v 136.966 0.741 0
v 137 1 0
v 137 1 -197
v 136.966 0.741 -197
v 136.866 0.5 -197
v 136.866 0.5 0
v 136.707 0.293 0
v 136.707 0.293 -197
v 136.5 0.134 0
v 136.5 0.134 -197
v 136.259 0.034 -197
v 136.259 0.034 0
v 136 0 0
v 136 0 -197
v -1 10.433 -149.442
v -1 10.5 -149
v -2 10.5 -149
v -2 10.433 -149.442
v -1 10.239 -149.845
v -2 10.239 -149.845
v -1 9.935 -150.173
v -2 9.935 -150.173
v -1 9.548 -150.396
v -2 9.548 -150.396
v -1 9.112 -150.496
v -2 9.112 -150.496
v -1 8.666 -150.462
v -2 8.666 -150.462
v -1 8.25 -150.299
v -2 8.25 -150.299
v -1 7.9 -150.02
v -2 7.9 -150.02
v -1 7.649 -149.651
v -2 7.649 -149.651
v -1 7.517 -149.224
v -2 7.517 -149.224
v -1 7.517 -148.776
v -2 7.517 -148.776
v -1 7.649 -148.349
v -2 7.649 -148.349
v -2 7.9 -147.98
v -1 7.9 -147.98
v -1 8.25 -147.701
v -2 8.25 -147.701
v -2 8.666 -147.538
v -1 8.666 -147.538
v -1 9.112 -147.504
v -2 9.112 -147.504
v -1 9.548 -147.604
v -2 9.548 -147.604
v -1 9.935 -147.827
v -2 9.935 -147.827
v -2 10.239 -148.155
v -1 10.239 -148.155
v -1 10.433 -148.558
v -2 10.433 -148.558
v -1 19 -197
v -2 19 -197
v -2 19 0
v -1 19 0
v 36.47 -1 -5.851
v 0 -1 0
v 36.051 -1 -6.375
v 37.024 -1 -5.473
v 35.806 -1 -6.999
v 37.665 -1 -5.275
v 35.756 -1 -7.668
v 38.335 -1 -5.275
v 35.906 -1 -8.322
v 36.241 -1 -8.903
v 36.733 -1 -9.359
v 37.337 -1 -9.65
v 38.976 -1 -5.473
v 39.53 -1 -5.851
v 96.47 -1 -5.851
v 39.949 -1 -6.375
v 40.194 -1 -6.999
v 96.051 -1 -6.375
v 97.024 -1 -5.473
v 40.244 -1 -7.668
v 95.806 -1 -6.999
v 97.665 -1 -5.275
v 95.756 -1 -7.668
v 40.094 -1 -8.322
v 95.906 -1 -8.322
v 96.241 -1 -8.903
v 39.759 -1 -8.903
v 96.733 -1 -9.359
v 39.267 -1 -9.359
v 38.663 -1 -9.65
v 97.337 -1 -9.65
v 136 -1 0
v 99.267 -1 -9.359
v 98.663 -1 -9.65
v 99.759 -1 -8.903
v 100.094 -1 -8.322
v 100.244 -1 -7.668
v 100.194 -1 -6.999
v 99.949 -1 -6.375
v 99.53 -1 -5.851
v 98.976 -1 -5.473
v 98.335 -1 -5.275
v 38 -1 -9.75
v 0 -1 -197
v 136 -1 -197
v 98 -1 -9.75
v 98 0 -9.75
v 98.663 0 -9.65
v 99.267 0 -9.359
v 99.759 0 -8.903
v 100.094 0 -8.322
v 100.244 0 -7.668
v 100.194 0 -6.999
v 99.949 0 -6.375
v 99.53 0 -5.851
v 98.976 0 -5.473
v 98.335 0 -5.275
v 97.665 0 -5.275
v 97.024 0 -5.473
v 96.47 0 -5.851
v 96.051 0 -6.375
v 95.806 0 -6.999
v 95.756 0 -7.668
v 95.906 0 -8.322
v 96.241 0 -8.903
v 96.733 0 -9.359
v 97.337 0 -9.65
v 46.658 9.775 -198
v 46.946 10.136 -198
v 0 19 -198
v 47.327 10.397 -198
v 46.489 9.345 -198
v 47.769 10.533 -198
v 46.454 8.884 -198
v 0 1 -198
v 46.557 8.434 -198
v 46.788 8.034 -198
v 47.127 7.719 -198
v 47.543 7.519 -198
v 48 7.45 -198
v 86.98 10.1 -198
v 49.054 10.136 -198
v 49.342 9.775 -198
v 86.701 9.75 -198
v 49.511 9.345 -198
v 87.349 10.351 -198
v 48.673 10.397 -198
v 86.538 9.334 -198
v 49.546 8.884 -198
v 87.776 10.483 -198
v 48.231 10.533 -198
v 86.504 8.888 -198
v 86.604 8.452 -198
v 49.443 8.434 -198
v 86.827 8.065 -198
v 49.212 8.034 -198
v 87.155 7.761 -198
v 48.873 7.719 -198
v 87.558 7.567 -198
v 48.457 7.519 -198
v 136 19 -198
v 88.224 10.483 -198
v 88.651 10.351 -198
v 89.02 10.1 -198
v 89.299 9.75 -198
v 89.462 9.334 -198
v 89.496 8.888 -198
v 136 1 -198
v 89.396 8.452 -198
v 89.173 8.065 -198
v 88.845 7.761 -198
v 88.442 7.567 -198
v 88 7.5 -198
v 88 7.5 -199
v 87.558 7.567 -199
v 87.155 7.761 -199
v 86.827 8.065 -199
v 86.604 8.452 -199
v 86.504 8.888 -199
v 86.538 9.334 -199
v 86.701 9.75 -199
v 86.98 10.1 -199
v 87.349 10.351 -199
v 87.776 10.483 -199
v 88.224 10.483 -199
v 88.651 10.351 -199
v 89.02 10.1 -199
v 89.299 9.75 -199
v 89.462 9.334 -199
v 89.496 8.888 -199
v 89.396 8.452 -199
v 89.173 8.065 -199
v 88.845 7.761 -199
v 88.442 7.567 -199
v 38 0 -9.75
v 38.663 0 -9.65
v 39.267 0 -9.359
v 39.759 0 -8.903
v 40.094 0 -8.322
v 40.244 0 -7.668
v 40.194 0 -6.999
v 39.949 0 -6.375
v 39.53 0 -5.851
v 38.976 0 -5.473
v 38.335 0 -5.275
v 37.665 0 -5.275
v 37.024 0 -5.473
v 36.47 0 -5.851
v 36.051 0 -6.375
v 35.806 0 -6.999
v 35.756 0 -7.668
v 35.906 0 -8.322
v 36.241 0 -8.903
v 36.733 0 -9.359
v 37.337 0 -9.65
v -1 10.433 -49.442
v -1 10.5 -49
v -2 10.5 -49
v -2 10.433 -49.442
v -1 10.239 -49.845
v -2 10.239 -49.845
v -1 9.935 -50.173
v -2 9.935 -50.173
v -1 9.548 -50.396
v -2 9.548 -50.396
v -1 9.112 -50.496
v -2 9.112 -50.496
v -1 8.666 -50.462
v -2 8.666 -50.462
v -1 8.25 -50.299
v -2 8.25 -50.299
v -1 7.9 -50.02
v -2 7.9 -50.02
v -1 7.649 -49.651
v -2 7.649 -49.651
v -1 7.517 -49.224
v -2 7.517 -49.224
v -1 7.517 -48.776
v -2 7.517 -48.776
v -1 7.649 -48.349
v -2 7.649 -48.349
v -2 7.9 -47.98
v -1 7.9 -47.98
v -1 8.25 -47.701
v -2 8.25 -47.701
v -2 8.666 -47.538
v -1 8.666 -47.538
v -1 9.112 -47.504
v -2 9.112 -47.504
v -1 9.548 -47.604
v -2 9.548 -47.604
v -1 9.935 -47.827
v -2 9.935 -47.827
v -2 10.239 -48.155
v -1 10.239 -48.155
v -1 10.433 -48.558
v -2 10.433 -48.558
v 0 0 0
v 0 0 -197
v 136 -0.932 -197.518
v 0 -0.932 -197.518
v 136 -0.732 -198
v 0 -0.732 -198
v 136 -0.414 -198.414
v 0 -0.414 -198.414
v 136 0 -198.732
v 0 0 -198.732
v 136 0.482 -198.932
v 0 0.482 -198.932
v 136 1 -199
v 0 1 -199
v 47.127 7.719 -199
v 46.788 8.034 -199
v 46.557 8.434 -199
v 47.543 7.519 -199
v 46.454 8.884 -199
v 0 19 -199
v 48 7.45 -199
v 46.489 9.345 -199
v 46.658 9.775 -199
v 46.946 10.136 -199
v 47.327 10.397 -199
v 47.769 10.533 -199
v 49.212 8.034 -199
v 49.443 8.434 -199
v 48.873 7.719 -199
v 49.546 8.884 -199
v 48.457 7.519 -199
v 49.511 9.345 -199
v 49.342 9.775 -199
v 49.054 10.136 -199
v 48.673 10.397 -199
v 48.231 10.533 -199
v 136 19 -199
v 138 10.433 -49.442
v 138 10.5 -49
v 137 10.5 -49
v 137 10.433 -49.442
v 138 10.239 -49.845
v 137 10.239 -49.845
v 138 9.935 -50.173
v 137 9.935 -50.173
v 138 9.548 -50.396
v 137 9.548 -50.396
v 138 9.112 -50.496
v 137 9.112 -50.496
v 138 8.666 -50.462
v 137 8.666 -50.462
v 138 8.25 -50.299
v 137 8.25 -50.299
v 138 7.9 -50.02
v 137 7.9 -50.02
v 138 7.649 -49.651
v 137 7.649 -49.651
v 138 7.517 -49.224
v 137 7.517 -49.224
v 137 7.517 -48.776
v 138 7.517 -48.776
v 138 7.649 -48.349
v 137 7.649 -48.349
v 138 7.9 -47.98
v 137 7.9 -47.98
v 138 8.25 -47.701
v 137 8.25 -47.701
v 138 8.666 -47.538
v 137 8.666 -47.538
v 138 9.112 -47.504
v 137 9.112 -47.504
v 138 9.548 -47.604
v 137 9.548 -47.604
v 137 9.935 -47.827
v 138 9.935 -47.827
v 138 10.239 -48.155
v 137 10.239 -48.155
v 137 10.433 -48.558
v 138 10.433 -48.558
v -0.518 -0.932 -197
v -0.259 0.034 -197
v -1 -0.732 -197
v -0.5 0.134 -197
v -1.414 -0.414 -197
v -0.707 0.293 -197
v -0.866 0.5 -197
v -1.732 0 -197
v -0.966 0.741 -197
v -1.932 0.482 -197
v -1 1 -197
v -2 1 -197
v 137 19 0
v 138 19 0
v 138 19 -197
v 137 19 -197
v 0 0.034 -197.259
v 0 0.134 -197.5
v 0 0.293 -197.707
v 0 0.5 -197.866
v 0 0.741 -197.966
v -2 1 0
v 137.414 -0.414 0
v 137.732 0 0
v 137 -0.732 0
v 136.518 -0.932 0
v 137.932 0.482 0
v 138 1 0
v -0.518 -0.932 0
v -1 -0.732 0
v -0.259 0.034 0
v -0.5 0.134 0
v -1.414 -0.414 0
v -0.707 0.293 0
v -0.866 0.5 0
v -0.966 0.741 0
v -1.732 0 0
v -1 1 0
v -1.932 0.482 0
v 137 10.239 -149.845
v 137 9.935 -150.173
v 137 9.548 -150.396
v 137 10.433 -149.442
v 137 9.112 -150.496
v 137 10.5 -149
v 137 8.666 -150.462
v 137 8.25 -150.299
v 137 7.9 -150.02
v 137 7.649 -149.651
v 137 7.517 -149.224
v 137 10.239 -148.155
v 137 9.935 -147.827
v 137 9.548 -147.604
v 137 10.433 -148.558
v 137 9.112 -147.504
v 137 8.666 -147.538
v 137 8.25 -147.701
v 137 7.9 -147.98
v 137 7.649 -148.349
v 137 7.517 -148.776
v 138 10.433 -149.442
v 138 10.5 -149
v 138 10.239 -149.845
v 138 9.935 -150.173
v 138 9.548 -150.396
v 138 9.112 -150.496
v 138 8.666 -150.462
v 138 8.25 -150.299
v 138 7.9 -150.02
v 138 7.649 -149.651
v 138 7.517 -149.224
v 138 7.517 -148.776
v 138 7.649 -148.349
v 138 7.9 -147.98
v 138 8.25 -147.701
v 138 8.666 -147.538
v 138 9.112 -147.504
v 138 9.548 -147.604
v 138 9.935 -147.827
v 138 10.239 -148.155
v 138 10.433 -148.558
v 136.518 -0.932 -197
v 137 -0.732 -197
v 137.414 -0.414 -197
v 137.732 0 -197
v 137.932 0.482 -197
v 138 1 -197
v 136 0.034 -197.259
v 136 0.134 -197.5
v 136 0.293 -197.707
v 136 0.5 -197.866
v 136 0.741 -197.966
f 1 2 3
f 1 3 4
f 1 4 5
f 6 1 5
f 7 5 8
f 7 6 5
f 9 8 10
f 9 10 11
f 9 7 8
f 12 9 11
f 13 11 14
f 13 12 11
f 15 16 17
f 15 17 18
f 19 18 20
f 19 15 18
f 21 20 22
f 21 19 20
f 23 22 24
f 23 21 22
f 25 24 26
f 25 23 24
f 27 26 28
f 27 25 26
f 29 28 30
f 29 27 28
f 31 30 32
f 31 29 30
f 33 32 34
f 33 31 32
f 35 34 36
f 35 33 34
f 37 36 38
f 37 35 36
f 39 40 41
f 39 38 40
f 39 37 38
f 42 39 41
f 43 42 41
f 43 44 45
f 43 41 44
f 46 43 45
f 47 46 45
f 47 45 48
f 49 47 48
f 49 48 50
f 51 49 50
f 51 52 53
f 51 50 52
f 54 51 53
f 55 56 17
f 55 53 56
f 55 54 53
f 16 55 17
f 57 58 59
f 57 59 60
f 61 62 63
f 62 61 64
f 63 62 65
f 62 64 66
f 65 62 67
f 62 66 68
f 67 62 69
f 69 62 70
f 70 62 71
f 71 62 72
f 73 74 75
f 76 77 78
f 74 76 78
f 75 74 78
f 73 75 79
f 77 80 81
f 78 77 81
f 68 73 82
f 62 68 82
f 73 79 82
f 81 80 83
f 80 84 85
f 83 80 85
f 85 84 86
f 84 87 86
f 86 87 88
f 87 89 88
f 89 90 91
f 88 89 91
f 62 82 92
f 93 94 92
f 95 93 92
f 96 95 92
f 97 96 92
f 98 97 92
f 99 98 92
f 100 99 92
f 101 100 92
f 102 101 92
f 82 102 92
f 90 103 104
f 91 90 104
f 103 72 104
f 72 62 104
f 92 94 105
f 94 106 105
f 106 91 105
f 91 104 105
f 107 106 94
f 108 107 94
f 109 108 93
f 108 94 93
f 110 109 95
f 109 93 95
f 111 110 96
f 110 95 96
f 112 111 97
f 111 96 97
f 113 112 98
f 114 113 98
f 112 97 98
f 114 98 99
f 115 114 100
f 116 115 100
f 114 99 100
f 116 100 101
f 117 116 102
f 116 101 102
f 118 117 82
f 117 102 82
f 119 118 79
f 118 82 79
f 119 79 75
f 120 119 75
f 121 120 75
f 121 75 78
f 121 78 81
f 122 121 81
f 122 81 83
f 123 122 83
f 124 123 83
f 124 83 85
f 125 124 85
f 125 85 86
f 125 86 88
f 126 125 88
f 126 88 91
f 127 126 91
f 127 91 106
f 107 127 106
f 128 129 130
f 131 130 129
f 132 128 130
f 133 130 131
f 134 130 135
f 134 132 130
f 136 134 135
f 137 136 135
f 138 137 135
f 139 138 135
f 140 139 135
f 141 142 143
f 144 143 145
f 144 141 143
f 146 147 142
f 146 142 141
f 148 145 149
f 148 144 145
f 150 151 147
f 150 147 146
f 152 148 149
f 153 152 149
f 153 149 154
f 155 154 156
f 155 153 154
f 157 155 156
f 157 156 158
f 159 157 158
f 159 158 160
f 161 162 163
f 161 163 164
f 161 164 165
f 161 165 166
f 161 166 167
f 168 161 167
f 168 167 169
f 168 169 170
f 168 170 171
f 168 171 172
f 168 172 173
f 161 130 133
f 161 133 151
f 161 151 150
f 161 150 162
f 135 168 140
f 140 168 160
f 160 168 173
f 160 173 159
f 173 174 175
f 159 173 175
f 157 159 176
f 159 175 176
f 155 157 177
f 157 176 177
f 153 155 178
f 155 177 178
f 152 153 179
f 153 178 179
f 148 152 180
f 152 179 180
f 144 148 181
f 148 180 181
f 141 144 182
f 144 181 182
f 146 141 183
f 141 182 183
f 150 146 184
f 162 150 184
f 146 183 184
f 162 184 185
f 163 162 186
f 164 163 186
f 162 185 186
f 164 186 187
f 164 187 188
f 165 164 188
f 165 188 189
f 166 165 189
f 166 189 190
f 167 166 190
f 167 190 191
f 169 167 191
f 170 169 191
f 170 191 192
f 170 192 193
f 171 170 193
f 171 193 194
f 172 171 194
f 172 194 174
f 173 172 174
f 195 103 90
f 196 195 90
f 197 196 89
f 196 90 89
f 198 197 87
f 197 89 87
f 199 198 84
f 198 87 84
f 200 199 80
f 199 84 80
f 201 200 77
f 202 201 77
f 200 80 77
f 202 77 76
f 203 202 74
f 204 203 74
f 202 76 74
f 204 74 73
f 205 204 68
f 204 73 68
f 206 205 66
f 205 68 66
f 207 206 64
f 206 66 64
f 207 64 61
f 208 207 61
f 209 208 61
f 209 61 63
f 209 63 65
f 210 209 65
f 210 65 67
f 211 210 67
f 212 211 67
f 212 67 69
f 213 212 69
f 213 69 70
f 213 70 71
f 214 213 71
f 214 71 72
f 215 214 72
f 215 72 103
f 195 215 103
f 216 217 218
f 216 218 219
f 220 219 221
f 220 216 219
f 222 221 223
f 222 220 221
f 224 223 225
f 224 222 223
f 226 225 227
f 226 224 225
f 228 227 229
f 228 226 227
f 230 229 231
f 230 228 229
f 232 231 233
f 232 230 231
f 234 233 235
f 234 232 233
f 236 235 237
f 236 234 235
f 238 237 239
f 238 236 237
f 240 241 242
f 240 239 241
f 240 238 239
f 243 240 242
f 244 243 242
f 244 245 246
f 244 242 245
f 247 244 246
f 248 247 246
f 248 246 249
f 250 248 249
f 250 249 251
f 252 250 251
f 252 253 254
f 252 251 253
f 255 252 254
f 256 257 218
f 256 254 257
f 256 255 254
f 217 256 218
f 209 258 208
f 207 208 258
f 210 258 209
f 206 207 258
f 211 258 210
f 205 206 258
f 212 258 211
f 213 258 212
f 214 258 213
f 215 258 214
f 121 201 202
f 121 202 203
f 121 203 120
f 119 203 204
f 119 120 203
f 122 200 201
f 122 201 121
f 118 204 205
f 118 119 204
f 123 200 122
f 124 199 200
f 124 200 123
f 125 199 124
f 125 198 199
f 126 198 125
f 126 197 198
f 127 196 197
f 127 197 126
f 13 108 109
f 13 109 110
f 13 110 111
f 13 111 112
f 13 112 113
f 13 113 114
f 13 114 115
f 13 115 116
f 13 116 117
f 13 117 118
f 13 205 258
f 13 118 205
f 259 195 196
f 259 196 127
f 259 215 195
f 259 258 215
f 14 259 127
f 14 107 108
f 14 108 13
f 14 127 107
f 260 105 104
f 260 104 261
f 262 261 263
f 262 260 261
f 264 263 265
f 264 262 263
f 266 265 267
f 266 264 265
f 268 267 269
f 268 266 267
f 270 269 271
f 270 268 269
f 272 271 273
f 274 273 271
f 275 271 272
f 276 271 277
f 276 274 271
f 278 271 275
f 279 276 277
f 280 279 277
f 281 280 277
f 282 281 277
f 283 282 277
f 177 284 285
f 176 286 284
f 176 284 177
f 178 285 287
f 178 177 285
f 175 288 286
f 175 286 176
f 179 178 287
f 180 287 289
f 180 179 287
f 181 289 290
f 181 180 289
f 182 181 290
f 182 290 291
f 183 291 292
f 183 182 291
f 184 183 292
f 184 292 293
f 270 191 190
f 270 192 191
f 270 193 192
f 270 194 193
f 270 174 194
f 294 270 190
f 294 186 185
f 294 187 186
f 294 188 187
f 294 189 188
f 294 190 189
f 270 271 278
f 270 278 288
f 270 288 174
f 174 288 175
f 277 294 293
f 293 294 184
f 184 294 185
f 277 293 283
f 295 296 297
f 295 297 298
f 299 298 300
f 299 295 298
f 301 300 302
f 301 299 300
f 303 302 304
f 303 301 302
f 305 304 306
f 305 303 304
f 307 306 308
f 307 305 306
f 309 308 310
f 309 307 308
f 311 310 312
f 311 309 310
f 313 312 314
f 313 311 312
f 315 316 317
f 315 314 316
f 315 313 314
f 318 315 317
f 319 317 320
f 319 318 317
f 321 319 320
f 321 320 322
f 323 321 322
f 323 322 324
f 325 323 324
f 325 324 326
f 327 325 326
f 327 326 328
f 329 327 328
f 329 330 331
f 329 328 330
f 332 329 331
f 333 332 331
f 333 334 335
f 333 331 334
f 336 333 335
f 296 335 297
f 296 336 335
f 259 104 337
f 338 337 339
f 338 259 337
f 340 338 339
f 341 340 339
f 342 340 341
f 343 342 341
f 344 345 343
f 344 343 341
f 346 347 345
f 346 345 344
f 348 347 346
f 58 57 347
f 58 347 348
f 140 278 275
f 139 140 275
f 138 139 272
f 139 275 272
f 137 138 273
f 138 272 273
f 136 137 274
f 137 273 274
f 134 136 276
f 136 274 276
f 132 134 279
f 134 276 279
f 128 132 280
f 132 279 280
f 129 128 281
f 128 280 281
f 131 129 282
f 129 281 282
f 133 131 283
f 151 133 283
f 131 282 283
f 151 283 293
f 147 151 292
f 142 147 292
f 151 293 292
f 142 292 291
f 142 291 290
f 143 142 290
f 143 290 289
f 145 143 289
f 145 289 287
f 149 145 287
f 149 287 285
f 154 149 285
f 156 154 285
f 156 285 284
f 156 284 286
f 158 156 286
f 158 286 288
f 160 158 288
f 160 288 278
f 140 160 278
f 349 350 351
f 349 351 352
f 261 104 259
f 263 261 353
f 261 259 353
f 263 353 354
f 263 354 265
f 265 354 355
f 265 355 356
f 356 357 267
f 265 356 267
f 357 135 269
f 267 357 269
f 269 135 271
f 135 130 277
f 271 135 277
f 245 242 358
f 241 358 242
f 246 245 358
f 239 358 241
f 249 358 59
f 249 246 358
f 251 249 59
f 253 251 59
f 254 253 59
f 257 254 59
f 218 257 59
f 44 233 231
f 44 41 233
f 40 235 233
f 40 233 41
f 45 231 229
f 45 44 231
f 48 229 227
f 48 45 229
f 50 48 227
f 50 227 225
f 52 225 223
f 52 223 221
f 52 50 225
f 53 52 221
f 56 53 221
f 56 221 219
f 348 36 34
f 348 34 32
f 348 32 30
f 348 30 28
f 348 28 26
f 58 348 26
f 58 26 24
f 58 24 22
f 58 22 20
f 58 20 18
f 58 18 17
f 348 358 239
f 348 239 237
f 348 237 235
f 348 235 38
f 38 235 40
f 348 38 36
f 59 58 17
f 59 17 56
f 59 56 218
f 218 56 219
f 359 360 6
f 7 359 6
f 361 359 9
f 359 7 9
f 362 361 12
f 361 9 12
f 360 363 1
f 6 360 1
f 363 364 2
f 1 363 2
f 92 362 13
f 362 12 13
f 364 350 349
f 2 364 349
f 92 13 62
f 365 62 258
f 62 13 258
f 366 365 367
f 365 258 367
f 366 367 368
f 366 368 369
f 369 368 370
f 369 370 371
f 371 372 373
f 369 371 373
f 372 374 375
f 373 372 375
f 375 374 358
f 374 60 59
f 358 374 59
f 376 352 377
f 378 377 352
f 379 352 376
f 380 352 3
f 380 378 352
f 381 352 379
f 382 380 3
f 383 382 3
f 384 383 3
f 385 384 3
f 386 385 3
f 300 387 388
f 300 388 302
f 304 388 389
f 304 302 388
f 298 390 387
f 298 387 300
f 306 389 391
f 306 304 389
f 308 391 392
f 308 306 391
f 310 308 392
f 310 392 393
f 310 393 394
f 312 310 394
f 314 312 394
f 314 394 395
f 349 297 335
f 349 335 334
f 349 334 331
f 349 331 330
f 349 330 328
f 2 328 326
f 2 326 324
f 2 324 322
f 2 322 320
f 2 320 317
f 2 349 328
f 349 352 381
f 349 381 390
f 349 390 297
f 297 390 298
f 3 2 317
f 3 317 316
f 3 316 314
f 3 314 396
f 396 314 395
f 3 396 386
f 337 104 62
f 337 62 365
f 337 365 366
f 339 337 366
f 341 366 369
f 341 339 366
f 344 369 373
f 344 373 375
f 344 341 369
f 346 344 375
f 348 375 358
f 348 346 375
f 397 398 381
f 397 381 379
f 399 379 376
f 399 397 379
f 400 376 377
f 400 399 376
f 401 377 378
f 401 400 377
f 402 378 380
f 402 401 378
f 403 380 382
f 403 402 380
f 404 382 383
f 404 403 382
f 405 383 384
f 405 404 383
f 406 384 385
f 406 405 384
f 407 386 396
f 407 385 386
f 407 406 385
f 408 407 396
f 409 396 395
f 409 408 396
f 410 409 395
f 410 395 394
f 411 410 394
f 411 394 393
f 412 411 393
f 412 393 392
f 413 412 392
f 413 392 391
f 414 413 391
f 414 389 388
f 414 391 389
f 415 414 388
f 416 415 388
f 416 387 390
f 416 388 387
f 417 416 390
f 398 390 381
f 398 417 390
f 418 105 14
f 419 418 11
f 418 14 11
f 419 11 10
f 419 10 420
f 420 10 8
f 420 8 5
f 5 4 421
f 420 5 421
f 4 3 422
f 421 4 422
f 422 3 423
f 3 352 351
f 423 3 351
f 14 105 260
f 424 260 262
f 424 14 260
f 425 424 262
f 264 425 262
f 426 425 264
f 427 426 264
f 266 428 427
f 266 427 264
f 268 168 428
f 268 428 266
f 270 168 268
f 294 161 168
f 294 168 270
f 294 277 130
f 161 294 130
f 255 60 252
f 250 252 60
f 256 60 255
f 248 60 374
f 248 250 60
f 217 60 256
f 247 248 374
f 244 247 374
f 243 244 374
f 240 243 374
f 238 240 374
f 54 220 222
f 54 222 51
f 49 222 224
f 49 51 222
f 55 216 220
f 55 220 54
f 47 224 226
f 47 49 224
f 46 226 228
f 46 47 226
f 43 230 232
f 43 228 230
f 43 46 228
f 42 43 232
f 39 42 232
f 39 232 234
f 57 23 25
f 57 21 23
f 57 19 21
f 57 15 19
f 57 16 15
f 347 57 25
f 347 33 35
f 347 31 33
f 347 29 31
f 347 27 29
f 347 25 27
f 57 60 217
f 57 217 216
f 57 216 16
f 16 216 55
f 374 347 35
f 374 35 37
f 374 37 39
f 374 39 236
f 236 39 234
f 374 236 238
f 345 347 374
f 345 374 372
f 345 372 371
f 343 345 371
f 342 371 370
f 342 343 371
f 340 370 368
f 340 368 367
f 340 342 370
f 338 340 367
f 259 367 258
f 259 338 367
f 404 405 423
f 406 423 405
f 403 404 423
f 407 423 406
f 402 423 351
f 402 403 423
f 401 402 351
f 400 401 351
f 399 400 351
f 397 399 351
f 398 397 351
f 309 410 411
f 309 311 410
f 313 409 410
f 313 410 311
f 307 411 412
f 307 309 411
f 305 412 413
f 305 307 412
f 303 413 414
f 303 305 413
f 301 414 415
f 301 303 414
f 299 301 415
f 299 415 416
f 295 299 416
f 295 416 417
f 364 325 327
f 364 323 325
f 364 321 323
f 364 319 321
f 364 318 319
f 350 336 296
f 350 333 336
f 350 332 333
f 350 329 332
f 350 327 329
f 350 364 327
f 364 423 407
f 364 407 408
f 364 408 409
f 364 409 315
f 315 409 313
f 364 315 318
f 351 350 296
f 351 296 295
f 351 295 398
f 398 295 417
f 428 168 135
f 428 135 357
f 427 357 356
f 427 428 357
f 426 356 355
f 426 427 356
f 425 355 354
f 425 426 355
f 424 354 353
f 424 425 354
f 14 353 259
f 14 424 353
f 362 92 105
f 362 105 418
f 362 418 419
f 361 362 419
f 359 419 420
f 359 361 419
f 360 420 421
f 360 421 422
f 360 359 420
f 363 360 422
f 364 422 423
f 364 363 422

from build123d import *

# Parameters (mm, degrees)
SKETCH1_W                    = 136
SKETCH1_H                    = 198
BASE_FLANGE1_DEPTH           = 1
EDGE_FLANGE1_STRIP_W         = 6
EDGE_FLANGE1_STRIP_H         = 1
EDGE_FLANGE1_STRIP_CUT_DEPTH = 136
EDGE_FLANGE1_DEPTH           = 136
EDGE_FLANGE2_DEPTH           = 197
EDGE_FLANGE3_DEPTH           = 197
CUT_EXTRUDE1_DEPTH           = 515.988593157
CUT_EXTRUDE1_DEPTH_BACK      = 159
SKETCH18_R                   = 1.5
SKETCH21_R                   = 2.25
CUT_EXTRUDE2_DEPTH           = 278
SKETCH26_R                   = 1.5
CUT_EXTRUDE7_DEPTH           = 10
SKETCH33_R                   = 1.55
CUT_EXTRUDE14_DEPTH          = 10


# Sheet-metal steps are written as plain solids
with BuildPart() as part:
    # Sketch1 → Base-Flange1 (new body)
    with BuildSketch(Plane(origin=(0, 0, 0), x_dir=(1, 0, 0), z_dir=(0, 1, 0))):
        with Locations((68, 99)):
            Rectangle(SKETCH1_W, SKETCH1_H)
    extrude(amount=-BASE_FLANGE1_DEPTH)

    # Edge-Flange1 strip (across the edge) → Edge-Flange1 strip cut (cut)
    with BuildSketch(Plane(origin=(136, 0, -198), x_dir=(0, 0, 1), z_dir=(-1, 0, 0))):
        with Locations((-2, -0.5)):
            Rectangle(EDGE_FLANGE1_STRIP_W, EDGE_FLANGE1_STRIP_H)
    extrude(amount=EDGE_FLANGE1_STRIP_CUT_DEPTH, mode=Mode.SUBTRACT)

    # Edge-Flange1 section (across the edge) → Edge-Flange1 (add)
    with BuildSketch(Plane(origin=(136, 0, -198), x_dir=(0, 0, 1), z_dir=(-1, 0, 0))):
        with BuildLine():
            Line((-1, 1), (-1, 19))
            Line((-1, 19), (0, 19))
            Line((0, 19), (0, 1))
            ThreePointArc((0, 1), (0.292893219, 0.292893219), (1, 0))
            Line((1, 0), (1, -1))
            ThreePointArc((1, -1), (-0.414213562, -0.414213562), (-1, 1))
        make_face()
    extrude(amount=EDGE_FLANGE1_DEPTH)

    # Edge-Flange2 section (across the edge) → Edge-Flange2 (add)
    with BuildSketch(Plane(origin=(137, 0, 0), x_dir=(-1, 0, 0), z_dir=(0, 0, -1))):
        with BuildLine():
            Line((-1, 1), (-1, 19))
            Line((-1, 19), (0, 19))
            Line((0, 19), (0, 1))
            ThreePointArc((0, 1), (0.292893219, 0.292893219), (1, 0))
            Line((1, 0), (1, -1))
            ThreePointArc((1, -1), (-0.414213562, -0.414213562), (-1, 1))
        make_face()
    extrude(amount=EDGE_FLANGE2_DEPTH)

    # Edge-Flange3 section (across the edge) → Edge-Flange3 (add)
    with BuildSketch(Plane(origin=(-1, 0, -197), x_dir=(1, 0, 0), z_dir=(0, 0, 1))):
        with BuildLine():
            Line((-1, 1), (-1, 19))
            Line((-1, 19), (0, 19))
            Line((0, 19), (0, 1))
            ThreePointArc((0, 1), (0.292893219, 0.292893219), (1, 0))
            Line((1, 0), (1, -1))
            ThreePointArc((1, -1), (-0.414213562, -0.414213562), (-1, 1))
        make_face()
    extrude(amount=EDGE_FLANGE3_DEPTH)

    # Sketch18 → Cut-Extrude1 (cut, two sides: drawn at the far end of the back side and taken through both)
    with BuildSketch(Plane(origin=(-3, 352.051657269, -347.400026456), x_dir=(0, 0, -1), z_dir=(-1, 0, 0)).offset(-CUT_EXTRUDE1_DEPTH_BACK)):
        with Locations(Location((-298.400026456, 343.051657269, 0), (0, 0, 270))):
            Circle(SKETCH18_R)
        with Locations(Location((-198.400026456, 343.051657269, 0), (0, 0, 270))):
            Circle(SKETCH18_R)
    extrude(amount=CUT_EXTRUDE1_DEPTH + CUT_EXTRUDE1_DEPTH_BACK, mode=Mode.SUBTRACT)

    # Sketch21 → Cut-Extrude2 (cut)
    with BuildSketch(Plane(origin=(-57.062536038, -1, -347.400026456), x_dir=(0, 0, 1), z_dir=(0, -1, 0))):
        with Locations(Location((339.900026456, -95.062536038, 0), (0, 0, 180))):
            Circle(SKETCH21_R)
        with Locations(Location((339.900026456, -155.062536038, 0), (0, 0, 180))):
            Circle(SKETCH21_R)
    extrude(amount=-CUT_EXTRUDE2_DEPTH, mode=Mode.SUBTRACT)

    # Sketch26 → Cut-Extrude7 (cut)
    with BuildSketch(Plane(origin=(-57.062536038, 352.051657269, -200), x_dir=(1, 0, 0), z_dir=(0, 0, -1))):
        with Locations(Location((105.062536038, 343.051657269, 0), (0, 0, 90))):
            Circle(SKETCH26_R)
        with Locations(Location((145.062536038, 343.051657269, 0), (0, 0, 90))):
            Circle(SKETCH26_R)
    extrude(amount=-CUT_EXTRUDE7_DEPTH, mode=Mode.SUBTRACT)

    # Sketch33 → Cut-Extrude14 (cut)
    with BuildSketch(Plane(origin=(193.062536038, -94.051657269, -200), x_dir=(-1, 0, 0), z_dir=(0, 0, -1))):
        with Locations(Location((145.062536038, 103.051657269, 0), (0, 0, 270))):
            Circle(SKETCH33_R)
    extrude(amount=-CUT_EXTRUDE14_DEPTH, mode=Mode.SUBTRACT)


solid = part.part
